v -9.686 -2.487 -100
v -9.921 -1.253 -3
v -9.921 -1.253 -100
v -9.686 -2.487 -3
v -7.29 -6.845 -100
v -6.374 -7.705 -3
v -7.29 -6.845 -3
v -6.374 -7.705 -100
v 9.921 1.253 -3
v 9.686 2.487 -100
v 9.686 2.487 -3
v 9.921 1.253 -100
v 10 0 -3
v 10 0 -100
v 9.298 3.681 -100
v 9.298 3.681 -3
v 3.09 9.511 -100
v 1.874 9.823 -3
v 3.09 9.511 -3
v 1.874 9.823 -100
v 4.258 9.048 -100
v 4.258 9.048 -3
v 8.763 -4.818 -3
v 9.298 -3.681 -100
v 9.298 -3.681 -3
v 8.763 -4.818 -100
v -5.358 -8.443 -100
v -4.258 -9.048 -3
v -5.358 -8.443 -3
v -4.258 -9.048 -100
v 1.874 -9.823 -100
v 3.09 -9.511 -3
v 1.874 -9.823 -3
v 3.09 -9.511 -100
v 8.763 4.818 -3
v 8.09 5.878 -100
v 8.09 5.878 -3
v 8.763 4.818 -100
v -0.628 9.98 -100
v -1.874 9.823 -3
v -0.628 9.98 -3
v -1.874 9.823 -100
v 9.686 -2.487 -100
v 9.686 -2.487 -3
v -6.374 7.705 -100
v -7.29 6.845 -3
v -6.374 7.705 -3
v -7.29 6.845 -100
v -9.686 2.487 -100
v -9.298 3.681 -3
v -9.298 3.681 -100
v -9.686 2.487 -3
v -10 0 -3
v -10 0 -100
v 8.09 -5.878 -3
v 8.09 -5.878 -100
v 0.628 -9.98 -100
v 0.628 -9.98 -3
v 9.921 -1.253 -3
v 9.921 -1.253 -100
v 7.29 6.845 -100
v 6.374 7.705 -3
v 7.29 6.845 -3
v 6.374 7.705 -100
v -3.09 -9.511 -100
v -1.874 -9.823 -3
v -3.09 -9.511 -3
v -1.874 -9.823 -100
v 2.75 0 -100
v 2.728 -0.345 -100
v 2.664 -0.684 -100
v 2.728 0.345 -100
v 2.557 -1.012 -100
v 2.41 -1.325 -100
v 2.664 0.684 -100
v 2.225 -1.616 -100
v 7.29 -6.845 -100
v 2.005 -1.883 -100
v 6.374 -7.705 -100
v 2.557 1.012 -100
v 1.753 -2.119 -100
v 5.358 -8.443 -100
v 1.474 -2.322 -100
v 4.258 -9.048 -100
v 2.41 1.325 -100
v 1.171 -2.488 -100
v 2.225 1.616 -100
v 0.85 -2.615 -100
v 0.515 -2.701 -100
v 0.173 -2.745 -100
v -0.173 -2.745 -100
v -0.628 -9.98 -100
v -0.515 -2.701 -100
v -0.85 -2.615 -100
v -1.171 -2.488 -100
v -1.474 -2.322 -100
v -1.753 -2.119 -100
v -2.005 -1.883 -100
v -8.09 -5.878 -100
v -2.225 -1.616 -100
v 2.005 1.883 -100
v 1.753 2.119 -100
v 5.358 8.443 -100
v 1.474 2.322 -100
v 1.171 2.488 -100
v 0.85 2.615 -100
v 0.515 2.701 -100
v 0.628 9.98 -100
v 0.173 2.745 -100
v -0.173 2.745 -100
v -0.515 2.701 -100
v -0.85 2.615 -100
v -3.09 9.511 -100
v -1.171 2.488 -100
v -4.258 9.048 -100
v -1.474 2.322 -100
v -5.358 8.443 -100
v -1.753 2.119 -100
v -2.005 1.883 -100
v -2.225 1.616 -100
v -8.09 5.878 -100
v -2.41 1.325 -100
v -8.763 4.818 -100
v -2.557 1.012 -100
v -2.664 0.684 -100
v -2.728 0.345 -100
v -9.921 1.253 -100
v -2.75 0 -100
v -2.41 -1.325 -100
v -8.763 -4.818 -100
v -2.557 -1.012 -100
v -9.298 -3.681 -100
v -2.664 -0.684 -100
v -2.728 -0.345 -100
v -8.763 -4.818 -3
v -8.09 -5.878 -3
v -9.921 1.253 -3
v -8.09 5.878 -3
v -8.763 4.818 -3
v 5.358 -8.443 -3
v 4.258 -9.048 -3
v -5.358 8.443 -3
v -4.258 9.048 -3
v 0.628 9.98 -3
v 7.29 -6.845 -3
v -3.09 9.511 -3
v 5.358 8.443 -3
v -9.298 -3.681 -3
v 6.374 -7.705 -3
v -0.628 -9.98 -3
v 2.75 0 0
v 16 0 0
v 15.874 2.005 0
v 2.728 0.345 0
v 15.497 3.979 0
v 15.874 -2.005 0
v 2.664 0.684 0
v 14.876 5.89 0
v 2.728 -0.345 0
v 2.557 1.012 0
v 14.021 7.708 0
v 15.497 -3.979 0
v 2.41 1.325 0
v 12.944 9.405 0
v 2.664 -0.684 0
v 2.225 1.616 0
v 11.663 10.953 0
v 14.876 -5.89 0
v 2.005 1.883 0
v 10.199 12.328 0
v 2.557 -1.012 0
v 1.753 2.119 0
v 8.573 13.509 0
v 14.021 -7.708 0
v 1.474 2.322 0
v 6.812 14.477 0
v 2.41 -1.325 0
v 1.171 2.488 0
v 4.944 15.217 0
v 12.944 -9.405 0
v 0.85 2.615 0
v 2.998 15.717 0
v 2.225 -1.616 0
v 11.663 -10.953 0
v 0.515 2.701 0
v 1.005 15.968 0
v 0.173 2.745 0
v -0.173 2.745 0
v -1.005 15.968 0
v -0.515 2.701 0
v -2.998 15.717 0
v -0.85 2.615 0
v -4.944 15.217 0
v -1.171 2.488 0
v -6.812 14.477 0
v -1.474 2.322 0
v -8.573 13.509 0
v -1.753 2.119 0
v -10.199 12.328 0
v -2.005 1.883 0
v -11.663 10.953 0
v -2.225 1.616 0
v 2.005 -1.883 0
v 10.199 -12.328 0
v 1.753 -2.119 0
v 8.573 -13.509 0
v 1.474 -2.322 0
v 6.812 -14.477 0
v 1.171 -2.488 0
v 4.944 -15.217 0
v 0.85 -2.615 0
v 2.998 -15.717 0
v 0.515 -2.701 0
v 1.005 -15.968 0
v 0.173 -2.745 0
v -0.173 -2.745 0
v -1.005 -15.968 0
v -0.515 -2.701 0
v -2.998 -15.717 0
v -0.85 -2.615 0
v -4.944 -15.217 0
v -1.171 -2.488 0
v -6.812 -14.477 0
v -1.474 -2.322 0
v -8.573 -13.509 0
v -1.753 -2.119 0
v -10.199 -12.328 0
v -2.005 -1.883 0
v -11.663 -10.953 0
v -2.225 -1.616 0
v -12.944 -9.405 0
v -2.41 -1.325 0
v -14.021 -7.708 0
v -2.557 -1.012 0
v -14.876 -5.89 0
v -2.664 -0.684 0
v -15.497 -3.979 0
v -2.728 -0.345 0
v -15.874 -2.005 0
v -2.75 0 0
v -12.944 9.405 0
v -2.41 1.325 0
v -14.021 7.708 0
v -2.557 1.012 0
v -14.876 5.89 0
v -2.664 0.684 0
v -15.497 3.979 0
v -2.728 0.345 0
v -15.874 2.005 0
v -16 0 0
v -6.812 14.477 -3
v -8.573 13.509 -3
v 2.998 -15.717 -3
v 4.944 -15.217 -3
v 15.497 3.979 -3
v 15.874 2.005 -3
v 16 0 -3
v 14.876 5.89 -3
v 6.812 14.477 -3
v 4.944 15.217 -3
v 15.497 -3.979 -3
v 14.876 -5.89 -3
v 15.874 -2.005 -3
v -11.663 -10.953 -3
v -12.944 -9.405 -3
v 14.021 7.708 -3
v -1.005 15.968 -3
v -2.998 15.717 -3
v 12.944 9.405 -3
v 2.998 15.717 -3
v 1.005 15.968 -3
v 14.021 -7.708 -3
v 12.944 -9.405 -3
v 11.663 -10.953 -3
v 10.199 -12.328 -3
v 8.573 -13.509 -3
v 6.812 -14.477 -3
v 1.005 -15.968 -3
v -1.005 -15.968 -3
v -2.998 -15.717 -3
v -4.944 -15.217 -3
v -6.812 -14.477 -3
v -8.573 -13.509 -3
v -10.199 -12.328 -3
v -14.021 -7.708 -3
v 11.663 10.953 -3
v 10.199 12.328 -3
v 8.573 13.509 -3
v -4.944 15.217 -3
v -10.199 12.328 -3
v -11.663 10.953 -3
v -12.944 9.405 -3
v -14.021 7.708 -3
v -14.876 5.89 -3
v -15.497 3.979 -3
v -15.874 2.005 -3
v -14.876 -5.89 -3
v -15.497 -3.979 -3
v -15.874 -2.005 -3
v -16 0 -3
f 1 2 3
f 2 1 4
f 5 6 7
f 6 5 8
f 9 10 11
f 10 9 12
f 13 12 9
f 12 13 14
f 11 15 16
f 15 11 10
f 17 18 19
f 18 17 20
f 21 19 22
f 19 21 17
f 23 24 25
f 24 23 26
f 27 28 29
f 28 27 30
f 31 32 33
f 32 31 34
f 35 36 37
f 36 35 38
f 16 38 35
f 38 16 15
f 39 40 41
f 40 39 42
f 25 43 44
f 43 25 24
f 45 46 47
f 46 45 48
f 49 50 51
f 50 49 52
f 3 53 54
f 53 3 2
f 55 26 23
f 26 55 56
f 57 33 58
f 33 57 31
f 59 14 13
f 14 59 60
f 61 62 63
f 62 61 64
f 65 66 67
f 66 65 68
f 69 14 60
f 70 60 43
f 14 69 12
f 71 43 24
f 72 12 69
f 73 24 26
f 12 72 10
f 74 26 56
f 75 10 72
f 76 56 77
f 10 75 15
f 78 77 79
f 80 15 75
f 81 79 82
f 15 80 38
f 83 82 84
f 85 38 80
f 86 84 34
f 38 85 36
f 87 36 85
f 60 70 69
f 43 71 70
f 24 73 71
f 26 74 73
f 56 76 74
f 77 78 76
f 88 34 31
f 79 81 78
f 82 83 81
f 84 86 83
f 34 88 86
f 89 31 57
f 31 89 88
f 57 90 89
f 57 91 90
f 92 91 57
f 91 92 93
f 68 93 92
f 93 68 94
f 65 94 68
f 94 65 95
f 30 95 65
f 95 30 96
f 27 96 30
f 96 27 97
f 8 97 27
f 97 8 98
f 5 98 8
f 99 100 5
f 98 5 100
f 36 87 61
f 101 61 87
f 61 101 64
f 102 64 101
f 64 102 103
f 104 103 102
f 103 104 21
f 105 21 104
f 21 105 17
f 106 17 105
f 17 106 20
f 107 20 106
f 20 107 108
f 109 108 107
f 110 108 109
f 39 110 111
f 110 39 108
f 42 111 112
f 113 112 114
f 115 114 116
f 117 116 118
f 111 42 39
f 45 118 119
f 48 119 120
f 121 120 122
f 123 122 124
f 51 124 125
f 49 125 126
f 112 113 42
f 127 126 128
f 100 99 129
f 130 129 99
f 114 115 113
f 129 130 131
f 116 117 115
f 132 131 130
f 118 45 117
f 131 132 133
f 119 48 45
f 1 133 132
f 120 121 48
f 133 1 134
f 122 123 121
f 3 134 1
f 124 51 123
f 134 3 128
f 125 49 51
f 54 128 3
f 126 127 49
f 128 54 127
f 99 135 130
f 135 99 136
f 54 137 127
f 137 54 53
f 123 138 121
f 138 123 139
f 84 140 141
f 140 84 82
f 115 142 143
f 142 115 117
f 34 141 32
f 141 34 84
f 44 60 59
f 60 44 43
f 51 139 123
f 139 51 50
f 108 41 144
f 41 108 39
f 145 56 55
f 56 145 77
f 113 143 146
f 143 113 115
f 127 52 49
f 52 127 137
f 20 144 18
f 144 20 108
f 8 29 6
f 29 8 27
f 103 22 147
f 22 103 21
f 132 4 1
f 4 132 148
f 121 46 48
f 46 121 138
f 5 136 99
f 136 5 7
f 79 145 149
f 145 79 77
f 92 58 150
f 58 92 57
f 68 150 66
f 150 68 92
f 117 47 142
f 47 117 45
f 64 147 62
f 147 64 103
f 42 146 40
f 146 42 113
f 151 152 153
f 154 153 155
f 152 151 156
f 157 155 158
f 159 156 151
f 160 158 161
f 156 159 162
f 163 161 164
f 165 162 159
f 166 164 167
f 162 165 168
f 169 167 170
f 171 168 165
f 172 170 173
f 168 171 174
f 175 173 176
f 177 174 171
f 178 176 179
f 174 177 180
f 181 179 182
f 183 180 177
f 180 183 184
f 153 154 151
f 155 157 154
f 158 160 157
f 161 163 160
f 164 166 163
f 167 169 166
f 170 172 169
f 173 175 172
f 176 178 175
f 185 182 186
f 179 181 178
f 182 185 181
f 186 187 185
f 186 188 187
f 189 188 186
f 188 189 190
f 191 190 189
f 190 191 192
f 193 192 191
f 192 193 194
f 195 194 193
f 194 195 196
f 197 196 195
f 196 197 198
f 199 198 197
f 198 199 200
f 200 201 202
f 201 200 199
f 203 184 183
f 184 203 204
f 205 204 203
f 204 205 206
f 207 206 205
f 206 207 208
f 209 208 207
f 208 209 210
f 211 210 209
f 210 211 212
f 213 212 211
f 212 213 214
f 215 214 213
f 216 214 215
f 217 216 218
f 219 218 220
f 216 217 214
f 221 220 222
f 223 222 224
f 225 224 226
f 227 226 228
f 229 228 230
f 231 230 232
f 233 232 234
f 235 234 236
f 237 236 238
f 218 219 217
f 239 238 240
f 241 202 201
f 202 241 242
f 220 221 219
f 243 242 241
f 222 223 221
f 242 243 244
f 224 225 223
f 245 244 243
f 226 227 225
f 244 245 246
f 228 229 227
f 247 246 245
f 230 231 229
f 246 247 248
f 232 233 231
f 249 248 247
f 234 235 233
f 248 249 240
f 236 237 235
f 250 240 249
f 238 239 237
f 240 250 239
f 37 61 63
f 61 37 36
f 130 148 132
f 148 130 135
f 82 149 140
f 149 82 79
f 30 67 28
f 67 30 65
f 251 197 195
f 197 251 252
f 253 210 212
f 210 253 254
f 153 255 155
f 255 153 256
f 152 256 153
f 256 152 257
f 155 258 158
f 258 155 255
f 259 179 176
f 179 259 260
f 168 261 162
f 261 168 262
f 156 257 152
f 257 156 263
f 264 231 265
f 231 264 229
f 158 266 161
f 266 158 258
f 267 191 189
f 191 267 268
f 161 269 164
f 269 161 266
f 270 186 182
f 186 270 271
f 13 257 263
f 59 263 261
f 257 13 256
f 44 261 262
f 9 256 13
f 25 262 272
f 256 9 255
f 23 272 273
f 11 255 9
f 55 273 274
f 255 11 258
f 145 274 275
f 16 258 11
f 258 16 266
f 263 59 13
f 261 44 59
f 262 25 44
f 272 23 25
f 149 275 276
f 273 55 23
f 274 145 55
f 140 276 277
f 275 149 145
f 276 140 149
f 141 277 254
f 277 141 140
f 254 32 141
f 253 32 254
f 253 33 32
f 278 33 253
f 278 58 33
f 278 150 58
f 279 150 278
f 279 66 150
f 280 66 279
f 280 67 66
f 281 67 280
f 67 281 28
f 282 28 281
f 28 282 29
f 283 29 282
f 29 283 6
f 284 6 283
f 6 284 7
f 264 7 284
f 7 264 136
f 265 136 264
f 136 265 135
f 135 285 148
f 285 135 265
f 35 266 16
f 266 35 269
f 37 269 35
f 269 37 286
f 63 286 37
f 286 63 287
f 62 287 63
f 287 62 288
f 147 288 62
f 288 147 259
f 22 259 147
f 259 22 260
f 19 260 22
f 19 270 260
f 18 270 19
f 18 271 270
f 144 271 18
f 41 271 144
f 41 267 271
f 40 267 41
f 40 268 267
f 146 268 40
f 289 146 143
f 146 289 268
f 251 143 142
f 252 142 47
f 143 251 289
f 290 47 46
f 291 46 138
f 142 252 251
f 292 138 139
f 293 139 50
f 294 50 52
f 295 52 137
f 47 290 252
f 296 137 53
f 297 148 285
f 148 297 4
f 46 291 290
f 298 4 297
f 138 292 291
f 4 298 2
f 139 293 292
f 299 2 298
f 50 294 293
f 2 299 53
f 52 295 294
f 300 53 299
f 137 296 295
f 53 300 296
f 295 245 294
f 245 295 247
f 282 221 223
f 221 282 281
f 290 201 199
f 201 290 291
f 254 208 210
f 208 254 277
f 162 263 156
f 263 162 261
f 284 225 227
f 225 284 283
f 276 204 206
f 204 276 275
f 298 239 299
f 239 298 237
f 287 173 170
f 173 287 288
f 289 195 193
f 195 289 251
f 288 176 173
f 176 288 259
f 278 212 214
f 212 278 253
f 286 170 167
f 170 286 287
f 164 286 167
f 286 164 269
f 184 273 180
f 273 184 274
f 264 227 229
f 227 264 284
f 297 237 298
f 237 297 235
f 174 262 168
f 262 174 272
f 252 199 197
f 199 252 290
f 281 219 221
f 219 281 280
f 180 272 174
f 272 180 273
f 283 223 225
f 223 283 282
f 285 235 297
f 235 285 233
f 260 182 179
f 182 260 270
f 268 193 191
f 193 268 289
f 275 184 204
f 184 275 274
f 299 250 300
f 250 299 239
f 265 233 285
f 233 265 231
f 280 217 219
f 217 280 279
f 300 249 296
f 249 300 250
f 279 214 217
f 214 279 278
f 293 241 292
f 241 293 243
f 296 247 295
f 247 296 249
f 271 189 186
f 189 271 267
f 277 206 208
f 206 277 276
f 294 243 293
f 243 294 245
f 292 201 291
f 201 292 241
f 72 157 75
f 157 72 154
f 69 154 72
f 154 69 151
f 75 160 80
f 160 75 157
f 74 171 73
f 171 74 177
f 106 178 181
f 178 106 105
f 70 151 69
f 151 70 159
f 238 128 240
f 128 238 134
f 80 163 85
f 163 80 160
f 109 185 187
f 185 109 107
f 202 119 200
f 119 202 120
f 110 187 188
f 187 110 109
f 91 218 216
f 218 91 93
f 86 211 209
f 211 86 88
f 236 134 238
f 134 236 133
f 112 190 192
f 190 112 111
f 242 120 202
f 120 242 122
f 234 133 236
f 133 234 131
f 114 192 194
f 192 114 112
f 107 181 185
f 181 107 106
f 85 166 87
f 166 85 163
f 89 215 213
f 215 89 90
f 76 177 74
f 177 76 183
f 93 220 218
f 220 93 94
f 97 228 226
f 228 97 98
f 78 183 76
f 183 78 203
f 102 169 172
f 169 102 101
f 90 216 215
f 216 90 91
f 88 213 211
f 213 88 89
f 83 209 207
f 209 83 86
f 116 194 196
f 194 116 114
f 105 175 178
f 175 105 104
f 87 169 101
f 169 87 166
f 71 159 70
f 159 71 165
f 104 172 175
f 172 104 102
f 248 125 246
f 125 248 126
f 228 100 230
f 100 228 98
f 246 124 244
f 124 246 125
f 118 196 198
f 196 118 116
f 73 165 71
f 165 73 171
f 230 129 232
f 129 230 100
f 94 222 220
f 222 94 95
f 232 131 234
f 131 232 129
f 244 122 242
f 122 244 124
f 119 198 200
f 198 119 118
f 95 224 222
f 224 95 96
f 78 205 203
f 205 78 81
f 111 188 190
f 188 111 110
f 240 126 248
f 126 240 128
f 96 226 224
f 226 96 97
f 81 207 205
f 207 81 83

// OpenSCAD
$fn = 50;


difference() {
	union() {
		translate(v = [0, 0, -100.0000000000]) {
			cylinder(h = 100, r = 10.0000000000);
		}
		translate(v = [0, 0, -3.0000000000]) {
			cylinder(h = 3, r = 16.0000000000);
		}
	}
	union() {
		#translate(v = [0, 0, -100]) {
			cylinder(h = 100, r = 2.7500000000);
		}
	}
}
